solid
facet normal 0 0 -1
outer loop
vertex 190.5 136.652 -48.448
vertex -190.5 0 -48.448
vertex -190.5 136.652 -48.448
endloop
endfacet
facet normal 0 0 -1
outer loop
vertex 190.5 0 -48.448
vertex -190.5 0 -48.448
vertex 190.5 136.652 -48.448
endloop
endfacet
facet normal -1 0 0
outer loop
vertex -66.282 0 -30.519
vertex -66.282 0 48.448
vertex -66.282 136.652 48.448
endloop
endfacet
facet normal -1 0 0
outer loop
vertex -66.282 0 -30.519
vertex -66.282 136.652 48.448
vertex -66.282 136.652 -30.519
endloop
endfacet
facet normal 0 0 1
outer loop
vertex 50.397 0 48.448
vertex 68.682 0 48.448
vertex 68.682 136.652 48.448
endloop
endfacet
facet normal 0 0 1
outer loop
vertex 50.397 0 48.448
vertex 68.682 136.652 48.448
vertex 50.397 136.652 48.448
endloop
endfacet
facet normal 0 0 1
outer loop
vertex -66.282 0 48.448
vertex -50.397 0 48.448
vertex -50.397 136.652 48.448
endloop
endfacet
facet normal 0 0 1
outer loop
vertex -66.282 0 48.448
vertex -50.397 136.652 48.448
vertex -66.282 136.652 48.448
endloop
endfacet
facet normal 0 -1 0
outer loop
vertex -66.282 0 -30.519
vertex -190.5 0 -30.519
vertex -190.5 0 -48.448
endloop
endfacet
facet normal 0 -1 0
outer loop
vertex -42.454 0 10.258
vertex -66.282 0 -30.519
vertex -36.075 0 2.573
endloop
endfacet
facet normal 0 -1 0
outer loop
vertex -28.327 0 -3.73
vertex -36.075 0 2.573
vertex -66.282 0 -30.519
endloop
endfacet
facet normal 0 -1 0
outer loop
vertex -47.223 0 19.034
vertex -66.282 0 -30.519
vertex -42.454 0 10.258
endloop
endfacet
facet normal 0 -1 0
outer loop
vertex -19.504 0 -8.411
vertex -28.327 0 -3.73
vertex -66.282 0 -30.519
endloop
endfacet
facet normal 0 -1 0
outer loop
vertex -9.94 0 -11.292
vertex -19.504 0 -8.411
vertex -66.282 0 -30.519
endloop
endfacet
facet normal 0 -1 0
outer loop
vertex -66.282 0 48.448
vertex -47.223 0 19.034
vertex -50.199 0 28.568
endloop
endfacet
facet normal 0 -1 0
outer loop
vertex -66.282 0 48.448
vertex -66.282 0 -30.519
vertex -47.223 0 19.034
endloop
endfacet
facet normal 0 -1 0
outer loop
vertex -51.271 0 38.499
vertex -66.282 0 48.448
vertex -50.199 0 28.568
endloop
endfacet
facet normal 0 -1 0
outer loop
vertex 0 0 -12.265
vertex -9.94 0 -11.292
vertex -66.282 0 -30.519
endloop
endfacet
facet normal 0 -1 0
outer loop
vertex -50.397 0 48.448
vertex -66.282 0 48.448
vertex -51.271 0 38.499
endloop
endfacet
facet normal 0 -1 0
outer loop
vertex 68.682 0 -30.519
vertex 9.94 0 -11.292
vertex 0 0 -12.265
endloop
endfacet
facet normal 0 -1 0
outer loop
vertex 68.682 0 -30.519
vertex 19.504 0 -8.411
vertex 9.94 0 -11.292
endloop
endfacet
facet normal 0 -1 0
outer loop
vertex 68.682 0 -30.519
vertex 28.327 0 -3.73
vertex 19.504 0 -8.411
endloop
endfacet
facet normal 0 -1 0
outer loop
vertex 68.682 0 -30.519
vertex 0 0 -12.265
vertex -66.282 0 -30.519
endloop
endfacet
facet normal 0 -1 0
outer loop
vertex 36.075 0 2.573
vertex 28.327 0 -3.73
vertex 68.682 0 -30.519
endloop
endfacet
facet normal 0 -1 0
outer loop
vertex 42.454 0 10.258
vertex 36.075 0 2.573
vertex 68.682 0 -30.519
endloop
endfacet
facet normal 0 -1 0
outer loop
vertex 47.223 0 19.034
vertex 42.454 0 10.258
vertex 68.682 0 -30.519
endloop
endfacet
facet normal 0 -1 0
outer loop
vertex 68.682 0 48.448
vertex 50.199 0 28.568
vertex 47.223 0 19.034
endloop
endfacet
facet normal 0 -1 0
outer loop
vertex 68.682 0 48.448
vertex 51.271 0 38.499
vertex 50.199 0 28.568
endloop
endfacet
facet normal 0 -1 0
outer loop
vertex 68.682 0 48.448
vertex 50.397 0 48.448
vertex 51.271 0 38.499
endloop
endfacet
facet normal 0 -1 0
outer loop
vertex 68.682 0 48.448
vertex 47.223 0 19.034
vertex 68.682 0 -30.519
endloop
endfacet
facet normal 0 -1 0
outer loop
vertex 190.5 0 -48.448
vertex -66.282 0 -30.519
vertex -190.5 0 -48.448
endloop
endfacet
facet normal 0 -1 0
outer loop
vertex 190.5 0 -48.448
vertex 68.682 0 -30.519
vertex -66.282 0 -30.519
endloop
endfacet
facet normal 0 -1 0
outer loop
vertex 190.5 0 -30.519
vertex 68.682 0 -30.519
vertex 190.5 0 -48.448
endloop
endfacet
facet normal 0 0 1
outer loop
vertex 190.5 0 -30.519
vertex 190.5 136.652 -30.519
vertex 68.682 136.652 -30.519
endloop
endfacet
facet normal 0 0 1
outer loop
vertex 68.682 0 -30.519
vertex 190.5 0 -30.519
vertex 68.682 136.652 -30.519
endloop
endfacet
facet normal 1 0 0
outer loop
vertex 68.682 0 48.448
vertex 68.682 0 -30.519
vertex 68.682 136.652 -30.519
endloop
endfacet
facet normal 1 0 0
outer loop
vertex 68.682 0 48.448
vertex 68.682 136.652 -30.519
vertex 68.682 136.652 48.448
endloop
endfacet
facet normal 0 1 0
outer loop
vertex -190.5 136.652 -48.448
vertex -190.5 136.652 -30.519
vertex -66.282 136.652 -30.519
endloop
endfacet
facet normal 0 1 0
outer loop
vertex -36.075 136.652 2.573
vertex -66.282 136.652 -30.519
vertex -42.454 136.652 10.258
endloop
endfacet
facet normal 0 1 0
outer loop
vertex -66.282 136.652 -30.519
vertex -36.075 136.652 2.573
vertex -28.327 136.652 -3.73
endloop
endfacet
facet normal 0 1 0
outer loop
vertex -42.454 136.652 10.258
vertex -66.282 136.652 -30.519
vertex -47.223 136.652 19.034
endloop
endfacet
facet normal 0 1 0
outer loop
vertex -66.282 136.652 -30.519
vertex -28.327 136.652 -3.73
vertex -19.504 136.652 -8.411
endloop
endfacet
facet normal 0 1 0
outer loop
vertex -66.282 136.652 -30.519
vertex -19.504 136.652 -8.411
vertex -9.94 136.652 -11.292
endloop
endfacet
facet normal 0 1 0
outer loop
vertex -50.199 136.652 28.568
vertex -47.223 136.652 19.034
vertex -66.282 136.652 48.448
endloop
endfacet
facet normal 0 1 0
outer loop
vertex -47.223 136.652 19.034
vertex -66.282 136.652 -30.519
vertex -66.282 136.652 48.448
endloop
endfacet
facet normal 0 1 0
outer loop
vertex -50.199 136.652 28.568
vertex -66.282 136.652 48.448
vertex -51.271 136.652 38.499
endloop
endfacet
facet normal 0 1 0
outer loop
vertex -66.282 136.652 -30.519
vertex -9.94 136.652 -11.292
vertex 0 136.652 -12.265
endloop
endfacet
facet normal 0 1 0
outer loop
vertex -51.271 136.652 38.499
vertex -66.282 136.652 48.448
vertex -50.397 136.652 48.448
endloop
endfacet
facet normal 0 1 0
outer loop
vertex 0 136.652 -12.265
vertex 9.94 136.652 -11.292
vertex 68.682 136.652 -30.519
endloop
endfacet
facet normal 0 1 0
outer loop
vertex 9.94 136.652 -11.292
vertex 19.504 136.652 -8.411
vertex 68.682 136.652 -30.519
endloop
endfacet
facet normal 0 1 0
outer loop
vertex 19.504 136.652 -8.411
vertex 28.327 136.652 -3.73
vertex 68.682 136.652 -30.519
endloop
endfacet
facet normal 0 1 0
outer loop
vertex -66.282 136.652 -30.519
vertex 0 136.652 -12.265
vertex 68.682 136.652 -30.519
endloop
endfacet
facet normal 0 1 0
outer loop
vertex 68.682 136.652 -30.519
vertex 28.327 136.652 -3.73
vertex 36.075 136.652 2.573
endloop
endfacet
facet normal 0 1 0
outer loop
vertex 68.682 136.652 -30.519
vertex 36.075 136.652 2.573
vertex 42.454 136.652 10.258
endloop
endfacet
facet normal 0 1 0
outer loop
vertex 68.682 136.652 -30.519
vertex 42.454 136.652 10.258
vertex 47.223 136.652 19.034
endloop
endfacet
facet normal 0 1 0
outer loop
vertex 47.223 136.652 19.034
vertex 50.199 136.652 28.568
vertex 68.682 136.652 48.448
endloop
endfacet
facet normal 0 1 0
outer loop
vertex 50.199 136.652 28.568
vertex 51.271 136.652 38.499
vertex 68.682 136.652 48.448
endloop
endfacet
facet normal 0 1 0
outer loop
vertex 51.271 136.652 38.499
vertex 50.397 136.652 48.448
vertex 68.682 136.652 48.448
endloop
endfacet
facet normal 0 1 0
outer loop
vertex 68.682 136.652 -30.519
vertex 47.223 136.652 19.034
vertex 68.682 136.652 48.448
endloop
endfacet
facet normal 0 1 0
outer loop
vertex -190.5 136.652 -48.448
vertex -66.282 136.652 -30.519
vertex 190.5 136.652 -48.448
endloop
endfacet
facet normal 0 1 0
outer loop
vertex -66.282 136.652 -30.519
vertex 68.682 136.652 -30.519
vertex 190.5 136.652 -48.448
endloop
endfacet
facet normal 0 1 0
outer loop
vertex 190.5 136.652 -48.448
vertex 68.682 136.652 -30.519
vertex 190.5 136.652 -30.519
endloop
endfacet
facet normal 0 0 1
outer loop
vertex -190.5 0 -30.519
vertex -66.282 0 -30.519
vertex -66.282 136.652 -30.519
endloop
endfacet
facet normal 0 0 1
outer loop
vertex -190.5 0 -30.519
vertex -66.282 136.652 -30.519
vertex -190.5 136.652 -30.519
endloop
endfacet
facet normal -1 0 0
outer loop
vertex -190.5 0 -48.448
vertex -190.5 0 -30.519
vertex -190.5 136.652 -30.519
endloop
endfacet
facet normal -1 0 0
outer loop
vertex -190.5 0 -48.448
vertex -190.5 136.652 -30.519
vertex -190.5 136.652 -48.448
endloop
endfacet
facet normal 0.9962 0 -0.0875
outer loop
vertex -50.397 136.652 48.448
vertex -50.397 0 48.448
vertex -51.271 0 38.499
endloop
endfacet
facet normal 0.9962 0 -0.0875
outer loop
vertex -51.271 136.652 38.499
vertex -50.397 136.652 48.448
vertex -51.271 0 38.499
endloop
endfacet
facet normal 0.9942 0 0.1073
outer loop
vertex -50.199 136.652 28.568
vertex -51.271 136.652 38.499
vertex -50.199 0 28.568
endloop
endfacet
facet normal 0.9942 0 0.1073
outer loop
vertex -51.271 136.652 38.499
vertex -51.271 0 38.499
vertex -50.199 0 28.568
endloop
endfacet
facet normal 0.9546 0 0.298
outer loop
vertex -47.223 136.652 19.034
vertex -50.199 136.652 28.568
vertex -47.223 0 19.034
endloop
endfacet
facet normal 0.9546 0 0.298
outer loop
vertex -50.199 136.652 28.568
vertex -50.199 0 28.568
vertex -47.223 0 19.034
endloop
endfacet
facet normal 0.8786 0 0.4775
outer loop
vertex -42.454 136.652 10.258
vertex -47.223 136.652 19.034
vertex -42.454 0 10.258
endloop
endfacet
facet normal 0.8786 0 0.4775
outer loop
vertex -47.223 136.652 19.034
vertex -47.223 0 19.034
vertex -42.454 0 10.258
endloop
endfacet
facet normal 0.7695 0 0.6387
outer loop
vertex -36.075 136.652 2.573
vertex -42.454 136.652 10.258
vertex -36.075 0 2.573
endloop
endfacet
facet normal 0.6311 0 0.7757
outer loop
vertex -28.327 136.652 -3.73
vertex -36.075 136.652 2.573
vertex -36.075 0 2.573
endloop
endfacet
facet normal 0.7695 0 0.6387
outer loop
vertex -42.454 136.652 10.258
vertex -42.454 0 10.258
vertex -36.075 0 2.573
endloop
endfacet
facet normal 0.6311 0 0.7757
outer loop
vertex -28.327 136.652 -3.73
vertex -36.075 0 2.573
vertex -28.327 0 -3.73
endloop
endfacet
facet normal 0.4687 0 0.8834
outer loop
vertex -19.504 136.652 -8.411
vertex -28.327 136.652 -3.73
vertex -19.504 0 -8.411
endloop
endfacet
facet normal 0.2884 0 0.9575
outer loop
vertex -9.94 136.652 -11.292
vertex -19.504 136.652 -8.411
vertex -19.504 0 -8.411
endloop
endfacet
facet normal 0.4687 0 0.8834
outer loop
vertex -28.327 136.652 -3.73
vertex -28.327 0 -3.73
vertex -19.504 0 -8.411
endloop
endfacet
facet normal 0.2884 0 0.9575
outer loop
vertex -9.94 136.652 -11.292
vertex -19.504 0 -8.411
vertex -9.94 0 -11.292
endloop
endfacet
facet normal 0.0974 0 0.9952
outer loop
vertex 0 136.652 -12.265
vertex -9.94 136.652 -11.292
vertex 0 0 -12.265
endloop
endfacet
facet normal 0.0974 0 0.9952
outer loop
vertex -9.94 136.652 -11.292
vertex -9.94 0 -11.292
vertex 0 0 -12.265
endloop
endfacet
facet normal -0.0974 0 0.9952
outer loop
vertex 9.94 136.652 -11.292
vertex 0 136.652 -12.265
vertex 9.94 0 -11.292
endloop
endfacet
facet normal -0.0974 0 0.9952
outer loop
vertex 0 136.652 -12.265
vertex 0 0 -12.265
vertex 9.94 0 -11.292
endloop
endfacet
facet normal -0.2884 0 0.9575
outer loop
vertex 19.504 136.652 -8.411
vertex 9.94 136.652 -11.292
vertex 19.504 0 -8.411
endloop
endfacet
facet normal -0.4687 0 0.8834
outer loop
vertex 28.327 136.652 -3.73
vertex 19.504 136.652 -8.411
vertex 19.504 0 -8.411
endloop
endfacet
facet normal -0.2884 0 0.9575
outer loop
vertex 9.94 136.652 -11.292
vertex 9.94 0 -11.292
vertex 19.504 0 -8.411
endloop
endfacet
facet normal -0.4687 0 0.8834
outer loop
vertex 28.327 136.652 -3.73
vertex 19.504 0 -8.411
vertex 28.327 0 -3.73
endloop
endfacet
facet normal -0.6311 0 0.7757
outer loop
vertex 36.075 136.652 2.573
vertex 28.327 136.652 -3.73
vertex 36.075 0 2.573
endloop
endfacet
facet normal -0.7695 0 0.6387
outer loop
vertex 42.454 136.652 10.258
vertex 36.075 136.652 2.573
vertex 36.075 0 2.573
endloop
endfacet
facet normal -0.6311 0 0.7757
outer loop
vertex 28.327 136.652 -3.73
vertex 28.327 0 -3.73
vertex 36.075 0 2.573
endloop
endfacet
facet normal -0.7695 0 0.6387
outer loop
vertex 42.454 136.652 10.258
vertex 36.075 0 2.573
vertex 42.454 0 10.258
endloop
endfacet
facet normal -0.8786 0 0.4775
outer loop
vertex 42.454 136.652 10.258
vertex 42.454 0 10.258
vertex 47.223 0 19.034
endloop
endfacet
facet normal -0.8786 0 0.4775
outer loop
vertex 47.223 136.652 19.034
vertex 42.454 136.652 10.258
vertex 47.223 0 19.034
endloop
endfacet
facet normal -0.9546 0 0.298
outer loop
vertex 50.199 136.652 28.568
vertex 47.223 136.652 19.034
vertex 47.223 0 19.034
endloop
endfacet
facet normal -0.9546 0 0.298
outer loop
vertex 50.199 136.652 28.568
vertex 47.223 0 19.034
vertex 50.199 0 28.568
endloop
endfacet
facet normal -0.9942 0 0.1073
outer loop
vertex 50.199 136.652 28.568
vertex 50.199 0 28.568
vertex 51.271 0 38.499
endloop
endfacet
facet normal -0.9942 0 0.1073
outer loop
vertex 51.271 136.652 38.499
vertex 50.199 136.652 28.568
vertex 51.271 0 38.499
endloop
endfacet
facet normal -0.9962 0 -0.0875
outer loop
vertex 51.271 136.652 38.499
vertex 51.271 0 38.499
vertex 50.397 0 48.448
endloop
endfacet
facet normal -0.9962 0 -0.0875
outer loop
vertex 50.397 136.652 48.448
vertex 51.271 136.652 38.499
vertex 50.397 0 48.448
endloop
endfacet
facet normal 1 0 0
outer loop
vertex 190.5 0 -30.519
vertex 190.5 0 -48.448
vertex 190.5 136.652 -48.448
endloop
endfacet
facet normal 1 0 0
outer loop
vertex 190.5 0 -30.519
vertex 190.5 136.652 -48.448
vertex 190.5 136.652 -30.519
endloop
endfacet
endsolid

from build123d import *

# Parameters (mm, degrees)
F1_DEPTH = 136.652
F2_DEPTH = 136.653
F0_W     = 124.218264
F0_H     = 78.966799
F0_W_2   = 121.818223
F3_DEPTH = 136.653


with BuildPart() as f1:
    # F0 (on Front) → F1 (new body)
    with BuildSketch(Plane.XZ):
        with BuildLine():
            Line((68.681777, -30.518653), (68.681777, 48.448146))
            Line((68.681777, 48.448146), (50.39659, 48.448146))
            ThreePointArc((50.39659, 48.448146), (0, -12.265111), (-50.39659, 48.448146))
            Line((-50.39659, 48.448146), (-66.281736, 48.448146))
            Line((-66.281736, 48.448146), (-66.281736, -30.518653))
            Line((-66.281736, -30.518653), (-190.5, -30.518653))
            Line((-190.5, -30.518653), (-190.5, -48.448146))
            Line((-190.5, -48.448146), (190.5, -48.448146))
            Line((190.5, -48.448146), (190.5, -30.518653))
            Line((190.5, -30.518653), (68.681777, -30.518653))
        make_face()
        with BuildLine():
            ThreePointArc((-50.39659, 48.448146), (0, -12.265111), (50.39659, 48.448146))
            Line((50.39659, 48.448146), (-50.39659, 48.448146))
        make_face()
    extrude(amount=-F1_DEPTH)

    # F0 (on Front) → F2 (cut, through all)
    with BuildSketch(Plane.XZ):
        with BuildLine():
            ThreePointArc((-50.39659, 48.448146), (0, -12.265111), (50.39659, 48.448146))
            Line((50.39659, 48.448146), (-50.39659, 48.448146))
        make_face()
    extrude(amount=-F2_DEPTH, mode=Mode.SUBTRACT)

    # F0 (on Front) → F3 (cut, through all)
    with BuildSketch(Plane.XZ):
        with Locations((-128.390868, 8.964747)):
            Rectangle(F0_W, F0_H)
        with Locations((129.590889, 8.964747)):
            Rectangle(F0_W_2, F0_H)
    extrude(amount=-F3_DEPTH, mode=Mode.SUBTRACT)


solid = f1.part
